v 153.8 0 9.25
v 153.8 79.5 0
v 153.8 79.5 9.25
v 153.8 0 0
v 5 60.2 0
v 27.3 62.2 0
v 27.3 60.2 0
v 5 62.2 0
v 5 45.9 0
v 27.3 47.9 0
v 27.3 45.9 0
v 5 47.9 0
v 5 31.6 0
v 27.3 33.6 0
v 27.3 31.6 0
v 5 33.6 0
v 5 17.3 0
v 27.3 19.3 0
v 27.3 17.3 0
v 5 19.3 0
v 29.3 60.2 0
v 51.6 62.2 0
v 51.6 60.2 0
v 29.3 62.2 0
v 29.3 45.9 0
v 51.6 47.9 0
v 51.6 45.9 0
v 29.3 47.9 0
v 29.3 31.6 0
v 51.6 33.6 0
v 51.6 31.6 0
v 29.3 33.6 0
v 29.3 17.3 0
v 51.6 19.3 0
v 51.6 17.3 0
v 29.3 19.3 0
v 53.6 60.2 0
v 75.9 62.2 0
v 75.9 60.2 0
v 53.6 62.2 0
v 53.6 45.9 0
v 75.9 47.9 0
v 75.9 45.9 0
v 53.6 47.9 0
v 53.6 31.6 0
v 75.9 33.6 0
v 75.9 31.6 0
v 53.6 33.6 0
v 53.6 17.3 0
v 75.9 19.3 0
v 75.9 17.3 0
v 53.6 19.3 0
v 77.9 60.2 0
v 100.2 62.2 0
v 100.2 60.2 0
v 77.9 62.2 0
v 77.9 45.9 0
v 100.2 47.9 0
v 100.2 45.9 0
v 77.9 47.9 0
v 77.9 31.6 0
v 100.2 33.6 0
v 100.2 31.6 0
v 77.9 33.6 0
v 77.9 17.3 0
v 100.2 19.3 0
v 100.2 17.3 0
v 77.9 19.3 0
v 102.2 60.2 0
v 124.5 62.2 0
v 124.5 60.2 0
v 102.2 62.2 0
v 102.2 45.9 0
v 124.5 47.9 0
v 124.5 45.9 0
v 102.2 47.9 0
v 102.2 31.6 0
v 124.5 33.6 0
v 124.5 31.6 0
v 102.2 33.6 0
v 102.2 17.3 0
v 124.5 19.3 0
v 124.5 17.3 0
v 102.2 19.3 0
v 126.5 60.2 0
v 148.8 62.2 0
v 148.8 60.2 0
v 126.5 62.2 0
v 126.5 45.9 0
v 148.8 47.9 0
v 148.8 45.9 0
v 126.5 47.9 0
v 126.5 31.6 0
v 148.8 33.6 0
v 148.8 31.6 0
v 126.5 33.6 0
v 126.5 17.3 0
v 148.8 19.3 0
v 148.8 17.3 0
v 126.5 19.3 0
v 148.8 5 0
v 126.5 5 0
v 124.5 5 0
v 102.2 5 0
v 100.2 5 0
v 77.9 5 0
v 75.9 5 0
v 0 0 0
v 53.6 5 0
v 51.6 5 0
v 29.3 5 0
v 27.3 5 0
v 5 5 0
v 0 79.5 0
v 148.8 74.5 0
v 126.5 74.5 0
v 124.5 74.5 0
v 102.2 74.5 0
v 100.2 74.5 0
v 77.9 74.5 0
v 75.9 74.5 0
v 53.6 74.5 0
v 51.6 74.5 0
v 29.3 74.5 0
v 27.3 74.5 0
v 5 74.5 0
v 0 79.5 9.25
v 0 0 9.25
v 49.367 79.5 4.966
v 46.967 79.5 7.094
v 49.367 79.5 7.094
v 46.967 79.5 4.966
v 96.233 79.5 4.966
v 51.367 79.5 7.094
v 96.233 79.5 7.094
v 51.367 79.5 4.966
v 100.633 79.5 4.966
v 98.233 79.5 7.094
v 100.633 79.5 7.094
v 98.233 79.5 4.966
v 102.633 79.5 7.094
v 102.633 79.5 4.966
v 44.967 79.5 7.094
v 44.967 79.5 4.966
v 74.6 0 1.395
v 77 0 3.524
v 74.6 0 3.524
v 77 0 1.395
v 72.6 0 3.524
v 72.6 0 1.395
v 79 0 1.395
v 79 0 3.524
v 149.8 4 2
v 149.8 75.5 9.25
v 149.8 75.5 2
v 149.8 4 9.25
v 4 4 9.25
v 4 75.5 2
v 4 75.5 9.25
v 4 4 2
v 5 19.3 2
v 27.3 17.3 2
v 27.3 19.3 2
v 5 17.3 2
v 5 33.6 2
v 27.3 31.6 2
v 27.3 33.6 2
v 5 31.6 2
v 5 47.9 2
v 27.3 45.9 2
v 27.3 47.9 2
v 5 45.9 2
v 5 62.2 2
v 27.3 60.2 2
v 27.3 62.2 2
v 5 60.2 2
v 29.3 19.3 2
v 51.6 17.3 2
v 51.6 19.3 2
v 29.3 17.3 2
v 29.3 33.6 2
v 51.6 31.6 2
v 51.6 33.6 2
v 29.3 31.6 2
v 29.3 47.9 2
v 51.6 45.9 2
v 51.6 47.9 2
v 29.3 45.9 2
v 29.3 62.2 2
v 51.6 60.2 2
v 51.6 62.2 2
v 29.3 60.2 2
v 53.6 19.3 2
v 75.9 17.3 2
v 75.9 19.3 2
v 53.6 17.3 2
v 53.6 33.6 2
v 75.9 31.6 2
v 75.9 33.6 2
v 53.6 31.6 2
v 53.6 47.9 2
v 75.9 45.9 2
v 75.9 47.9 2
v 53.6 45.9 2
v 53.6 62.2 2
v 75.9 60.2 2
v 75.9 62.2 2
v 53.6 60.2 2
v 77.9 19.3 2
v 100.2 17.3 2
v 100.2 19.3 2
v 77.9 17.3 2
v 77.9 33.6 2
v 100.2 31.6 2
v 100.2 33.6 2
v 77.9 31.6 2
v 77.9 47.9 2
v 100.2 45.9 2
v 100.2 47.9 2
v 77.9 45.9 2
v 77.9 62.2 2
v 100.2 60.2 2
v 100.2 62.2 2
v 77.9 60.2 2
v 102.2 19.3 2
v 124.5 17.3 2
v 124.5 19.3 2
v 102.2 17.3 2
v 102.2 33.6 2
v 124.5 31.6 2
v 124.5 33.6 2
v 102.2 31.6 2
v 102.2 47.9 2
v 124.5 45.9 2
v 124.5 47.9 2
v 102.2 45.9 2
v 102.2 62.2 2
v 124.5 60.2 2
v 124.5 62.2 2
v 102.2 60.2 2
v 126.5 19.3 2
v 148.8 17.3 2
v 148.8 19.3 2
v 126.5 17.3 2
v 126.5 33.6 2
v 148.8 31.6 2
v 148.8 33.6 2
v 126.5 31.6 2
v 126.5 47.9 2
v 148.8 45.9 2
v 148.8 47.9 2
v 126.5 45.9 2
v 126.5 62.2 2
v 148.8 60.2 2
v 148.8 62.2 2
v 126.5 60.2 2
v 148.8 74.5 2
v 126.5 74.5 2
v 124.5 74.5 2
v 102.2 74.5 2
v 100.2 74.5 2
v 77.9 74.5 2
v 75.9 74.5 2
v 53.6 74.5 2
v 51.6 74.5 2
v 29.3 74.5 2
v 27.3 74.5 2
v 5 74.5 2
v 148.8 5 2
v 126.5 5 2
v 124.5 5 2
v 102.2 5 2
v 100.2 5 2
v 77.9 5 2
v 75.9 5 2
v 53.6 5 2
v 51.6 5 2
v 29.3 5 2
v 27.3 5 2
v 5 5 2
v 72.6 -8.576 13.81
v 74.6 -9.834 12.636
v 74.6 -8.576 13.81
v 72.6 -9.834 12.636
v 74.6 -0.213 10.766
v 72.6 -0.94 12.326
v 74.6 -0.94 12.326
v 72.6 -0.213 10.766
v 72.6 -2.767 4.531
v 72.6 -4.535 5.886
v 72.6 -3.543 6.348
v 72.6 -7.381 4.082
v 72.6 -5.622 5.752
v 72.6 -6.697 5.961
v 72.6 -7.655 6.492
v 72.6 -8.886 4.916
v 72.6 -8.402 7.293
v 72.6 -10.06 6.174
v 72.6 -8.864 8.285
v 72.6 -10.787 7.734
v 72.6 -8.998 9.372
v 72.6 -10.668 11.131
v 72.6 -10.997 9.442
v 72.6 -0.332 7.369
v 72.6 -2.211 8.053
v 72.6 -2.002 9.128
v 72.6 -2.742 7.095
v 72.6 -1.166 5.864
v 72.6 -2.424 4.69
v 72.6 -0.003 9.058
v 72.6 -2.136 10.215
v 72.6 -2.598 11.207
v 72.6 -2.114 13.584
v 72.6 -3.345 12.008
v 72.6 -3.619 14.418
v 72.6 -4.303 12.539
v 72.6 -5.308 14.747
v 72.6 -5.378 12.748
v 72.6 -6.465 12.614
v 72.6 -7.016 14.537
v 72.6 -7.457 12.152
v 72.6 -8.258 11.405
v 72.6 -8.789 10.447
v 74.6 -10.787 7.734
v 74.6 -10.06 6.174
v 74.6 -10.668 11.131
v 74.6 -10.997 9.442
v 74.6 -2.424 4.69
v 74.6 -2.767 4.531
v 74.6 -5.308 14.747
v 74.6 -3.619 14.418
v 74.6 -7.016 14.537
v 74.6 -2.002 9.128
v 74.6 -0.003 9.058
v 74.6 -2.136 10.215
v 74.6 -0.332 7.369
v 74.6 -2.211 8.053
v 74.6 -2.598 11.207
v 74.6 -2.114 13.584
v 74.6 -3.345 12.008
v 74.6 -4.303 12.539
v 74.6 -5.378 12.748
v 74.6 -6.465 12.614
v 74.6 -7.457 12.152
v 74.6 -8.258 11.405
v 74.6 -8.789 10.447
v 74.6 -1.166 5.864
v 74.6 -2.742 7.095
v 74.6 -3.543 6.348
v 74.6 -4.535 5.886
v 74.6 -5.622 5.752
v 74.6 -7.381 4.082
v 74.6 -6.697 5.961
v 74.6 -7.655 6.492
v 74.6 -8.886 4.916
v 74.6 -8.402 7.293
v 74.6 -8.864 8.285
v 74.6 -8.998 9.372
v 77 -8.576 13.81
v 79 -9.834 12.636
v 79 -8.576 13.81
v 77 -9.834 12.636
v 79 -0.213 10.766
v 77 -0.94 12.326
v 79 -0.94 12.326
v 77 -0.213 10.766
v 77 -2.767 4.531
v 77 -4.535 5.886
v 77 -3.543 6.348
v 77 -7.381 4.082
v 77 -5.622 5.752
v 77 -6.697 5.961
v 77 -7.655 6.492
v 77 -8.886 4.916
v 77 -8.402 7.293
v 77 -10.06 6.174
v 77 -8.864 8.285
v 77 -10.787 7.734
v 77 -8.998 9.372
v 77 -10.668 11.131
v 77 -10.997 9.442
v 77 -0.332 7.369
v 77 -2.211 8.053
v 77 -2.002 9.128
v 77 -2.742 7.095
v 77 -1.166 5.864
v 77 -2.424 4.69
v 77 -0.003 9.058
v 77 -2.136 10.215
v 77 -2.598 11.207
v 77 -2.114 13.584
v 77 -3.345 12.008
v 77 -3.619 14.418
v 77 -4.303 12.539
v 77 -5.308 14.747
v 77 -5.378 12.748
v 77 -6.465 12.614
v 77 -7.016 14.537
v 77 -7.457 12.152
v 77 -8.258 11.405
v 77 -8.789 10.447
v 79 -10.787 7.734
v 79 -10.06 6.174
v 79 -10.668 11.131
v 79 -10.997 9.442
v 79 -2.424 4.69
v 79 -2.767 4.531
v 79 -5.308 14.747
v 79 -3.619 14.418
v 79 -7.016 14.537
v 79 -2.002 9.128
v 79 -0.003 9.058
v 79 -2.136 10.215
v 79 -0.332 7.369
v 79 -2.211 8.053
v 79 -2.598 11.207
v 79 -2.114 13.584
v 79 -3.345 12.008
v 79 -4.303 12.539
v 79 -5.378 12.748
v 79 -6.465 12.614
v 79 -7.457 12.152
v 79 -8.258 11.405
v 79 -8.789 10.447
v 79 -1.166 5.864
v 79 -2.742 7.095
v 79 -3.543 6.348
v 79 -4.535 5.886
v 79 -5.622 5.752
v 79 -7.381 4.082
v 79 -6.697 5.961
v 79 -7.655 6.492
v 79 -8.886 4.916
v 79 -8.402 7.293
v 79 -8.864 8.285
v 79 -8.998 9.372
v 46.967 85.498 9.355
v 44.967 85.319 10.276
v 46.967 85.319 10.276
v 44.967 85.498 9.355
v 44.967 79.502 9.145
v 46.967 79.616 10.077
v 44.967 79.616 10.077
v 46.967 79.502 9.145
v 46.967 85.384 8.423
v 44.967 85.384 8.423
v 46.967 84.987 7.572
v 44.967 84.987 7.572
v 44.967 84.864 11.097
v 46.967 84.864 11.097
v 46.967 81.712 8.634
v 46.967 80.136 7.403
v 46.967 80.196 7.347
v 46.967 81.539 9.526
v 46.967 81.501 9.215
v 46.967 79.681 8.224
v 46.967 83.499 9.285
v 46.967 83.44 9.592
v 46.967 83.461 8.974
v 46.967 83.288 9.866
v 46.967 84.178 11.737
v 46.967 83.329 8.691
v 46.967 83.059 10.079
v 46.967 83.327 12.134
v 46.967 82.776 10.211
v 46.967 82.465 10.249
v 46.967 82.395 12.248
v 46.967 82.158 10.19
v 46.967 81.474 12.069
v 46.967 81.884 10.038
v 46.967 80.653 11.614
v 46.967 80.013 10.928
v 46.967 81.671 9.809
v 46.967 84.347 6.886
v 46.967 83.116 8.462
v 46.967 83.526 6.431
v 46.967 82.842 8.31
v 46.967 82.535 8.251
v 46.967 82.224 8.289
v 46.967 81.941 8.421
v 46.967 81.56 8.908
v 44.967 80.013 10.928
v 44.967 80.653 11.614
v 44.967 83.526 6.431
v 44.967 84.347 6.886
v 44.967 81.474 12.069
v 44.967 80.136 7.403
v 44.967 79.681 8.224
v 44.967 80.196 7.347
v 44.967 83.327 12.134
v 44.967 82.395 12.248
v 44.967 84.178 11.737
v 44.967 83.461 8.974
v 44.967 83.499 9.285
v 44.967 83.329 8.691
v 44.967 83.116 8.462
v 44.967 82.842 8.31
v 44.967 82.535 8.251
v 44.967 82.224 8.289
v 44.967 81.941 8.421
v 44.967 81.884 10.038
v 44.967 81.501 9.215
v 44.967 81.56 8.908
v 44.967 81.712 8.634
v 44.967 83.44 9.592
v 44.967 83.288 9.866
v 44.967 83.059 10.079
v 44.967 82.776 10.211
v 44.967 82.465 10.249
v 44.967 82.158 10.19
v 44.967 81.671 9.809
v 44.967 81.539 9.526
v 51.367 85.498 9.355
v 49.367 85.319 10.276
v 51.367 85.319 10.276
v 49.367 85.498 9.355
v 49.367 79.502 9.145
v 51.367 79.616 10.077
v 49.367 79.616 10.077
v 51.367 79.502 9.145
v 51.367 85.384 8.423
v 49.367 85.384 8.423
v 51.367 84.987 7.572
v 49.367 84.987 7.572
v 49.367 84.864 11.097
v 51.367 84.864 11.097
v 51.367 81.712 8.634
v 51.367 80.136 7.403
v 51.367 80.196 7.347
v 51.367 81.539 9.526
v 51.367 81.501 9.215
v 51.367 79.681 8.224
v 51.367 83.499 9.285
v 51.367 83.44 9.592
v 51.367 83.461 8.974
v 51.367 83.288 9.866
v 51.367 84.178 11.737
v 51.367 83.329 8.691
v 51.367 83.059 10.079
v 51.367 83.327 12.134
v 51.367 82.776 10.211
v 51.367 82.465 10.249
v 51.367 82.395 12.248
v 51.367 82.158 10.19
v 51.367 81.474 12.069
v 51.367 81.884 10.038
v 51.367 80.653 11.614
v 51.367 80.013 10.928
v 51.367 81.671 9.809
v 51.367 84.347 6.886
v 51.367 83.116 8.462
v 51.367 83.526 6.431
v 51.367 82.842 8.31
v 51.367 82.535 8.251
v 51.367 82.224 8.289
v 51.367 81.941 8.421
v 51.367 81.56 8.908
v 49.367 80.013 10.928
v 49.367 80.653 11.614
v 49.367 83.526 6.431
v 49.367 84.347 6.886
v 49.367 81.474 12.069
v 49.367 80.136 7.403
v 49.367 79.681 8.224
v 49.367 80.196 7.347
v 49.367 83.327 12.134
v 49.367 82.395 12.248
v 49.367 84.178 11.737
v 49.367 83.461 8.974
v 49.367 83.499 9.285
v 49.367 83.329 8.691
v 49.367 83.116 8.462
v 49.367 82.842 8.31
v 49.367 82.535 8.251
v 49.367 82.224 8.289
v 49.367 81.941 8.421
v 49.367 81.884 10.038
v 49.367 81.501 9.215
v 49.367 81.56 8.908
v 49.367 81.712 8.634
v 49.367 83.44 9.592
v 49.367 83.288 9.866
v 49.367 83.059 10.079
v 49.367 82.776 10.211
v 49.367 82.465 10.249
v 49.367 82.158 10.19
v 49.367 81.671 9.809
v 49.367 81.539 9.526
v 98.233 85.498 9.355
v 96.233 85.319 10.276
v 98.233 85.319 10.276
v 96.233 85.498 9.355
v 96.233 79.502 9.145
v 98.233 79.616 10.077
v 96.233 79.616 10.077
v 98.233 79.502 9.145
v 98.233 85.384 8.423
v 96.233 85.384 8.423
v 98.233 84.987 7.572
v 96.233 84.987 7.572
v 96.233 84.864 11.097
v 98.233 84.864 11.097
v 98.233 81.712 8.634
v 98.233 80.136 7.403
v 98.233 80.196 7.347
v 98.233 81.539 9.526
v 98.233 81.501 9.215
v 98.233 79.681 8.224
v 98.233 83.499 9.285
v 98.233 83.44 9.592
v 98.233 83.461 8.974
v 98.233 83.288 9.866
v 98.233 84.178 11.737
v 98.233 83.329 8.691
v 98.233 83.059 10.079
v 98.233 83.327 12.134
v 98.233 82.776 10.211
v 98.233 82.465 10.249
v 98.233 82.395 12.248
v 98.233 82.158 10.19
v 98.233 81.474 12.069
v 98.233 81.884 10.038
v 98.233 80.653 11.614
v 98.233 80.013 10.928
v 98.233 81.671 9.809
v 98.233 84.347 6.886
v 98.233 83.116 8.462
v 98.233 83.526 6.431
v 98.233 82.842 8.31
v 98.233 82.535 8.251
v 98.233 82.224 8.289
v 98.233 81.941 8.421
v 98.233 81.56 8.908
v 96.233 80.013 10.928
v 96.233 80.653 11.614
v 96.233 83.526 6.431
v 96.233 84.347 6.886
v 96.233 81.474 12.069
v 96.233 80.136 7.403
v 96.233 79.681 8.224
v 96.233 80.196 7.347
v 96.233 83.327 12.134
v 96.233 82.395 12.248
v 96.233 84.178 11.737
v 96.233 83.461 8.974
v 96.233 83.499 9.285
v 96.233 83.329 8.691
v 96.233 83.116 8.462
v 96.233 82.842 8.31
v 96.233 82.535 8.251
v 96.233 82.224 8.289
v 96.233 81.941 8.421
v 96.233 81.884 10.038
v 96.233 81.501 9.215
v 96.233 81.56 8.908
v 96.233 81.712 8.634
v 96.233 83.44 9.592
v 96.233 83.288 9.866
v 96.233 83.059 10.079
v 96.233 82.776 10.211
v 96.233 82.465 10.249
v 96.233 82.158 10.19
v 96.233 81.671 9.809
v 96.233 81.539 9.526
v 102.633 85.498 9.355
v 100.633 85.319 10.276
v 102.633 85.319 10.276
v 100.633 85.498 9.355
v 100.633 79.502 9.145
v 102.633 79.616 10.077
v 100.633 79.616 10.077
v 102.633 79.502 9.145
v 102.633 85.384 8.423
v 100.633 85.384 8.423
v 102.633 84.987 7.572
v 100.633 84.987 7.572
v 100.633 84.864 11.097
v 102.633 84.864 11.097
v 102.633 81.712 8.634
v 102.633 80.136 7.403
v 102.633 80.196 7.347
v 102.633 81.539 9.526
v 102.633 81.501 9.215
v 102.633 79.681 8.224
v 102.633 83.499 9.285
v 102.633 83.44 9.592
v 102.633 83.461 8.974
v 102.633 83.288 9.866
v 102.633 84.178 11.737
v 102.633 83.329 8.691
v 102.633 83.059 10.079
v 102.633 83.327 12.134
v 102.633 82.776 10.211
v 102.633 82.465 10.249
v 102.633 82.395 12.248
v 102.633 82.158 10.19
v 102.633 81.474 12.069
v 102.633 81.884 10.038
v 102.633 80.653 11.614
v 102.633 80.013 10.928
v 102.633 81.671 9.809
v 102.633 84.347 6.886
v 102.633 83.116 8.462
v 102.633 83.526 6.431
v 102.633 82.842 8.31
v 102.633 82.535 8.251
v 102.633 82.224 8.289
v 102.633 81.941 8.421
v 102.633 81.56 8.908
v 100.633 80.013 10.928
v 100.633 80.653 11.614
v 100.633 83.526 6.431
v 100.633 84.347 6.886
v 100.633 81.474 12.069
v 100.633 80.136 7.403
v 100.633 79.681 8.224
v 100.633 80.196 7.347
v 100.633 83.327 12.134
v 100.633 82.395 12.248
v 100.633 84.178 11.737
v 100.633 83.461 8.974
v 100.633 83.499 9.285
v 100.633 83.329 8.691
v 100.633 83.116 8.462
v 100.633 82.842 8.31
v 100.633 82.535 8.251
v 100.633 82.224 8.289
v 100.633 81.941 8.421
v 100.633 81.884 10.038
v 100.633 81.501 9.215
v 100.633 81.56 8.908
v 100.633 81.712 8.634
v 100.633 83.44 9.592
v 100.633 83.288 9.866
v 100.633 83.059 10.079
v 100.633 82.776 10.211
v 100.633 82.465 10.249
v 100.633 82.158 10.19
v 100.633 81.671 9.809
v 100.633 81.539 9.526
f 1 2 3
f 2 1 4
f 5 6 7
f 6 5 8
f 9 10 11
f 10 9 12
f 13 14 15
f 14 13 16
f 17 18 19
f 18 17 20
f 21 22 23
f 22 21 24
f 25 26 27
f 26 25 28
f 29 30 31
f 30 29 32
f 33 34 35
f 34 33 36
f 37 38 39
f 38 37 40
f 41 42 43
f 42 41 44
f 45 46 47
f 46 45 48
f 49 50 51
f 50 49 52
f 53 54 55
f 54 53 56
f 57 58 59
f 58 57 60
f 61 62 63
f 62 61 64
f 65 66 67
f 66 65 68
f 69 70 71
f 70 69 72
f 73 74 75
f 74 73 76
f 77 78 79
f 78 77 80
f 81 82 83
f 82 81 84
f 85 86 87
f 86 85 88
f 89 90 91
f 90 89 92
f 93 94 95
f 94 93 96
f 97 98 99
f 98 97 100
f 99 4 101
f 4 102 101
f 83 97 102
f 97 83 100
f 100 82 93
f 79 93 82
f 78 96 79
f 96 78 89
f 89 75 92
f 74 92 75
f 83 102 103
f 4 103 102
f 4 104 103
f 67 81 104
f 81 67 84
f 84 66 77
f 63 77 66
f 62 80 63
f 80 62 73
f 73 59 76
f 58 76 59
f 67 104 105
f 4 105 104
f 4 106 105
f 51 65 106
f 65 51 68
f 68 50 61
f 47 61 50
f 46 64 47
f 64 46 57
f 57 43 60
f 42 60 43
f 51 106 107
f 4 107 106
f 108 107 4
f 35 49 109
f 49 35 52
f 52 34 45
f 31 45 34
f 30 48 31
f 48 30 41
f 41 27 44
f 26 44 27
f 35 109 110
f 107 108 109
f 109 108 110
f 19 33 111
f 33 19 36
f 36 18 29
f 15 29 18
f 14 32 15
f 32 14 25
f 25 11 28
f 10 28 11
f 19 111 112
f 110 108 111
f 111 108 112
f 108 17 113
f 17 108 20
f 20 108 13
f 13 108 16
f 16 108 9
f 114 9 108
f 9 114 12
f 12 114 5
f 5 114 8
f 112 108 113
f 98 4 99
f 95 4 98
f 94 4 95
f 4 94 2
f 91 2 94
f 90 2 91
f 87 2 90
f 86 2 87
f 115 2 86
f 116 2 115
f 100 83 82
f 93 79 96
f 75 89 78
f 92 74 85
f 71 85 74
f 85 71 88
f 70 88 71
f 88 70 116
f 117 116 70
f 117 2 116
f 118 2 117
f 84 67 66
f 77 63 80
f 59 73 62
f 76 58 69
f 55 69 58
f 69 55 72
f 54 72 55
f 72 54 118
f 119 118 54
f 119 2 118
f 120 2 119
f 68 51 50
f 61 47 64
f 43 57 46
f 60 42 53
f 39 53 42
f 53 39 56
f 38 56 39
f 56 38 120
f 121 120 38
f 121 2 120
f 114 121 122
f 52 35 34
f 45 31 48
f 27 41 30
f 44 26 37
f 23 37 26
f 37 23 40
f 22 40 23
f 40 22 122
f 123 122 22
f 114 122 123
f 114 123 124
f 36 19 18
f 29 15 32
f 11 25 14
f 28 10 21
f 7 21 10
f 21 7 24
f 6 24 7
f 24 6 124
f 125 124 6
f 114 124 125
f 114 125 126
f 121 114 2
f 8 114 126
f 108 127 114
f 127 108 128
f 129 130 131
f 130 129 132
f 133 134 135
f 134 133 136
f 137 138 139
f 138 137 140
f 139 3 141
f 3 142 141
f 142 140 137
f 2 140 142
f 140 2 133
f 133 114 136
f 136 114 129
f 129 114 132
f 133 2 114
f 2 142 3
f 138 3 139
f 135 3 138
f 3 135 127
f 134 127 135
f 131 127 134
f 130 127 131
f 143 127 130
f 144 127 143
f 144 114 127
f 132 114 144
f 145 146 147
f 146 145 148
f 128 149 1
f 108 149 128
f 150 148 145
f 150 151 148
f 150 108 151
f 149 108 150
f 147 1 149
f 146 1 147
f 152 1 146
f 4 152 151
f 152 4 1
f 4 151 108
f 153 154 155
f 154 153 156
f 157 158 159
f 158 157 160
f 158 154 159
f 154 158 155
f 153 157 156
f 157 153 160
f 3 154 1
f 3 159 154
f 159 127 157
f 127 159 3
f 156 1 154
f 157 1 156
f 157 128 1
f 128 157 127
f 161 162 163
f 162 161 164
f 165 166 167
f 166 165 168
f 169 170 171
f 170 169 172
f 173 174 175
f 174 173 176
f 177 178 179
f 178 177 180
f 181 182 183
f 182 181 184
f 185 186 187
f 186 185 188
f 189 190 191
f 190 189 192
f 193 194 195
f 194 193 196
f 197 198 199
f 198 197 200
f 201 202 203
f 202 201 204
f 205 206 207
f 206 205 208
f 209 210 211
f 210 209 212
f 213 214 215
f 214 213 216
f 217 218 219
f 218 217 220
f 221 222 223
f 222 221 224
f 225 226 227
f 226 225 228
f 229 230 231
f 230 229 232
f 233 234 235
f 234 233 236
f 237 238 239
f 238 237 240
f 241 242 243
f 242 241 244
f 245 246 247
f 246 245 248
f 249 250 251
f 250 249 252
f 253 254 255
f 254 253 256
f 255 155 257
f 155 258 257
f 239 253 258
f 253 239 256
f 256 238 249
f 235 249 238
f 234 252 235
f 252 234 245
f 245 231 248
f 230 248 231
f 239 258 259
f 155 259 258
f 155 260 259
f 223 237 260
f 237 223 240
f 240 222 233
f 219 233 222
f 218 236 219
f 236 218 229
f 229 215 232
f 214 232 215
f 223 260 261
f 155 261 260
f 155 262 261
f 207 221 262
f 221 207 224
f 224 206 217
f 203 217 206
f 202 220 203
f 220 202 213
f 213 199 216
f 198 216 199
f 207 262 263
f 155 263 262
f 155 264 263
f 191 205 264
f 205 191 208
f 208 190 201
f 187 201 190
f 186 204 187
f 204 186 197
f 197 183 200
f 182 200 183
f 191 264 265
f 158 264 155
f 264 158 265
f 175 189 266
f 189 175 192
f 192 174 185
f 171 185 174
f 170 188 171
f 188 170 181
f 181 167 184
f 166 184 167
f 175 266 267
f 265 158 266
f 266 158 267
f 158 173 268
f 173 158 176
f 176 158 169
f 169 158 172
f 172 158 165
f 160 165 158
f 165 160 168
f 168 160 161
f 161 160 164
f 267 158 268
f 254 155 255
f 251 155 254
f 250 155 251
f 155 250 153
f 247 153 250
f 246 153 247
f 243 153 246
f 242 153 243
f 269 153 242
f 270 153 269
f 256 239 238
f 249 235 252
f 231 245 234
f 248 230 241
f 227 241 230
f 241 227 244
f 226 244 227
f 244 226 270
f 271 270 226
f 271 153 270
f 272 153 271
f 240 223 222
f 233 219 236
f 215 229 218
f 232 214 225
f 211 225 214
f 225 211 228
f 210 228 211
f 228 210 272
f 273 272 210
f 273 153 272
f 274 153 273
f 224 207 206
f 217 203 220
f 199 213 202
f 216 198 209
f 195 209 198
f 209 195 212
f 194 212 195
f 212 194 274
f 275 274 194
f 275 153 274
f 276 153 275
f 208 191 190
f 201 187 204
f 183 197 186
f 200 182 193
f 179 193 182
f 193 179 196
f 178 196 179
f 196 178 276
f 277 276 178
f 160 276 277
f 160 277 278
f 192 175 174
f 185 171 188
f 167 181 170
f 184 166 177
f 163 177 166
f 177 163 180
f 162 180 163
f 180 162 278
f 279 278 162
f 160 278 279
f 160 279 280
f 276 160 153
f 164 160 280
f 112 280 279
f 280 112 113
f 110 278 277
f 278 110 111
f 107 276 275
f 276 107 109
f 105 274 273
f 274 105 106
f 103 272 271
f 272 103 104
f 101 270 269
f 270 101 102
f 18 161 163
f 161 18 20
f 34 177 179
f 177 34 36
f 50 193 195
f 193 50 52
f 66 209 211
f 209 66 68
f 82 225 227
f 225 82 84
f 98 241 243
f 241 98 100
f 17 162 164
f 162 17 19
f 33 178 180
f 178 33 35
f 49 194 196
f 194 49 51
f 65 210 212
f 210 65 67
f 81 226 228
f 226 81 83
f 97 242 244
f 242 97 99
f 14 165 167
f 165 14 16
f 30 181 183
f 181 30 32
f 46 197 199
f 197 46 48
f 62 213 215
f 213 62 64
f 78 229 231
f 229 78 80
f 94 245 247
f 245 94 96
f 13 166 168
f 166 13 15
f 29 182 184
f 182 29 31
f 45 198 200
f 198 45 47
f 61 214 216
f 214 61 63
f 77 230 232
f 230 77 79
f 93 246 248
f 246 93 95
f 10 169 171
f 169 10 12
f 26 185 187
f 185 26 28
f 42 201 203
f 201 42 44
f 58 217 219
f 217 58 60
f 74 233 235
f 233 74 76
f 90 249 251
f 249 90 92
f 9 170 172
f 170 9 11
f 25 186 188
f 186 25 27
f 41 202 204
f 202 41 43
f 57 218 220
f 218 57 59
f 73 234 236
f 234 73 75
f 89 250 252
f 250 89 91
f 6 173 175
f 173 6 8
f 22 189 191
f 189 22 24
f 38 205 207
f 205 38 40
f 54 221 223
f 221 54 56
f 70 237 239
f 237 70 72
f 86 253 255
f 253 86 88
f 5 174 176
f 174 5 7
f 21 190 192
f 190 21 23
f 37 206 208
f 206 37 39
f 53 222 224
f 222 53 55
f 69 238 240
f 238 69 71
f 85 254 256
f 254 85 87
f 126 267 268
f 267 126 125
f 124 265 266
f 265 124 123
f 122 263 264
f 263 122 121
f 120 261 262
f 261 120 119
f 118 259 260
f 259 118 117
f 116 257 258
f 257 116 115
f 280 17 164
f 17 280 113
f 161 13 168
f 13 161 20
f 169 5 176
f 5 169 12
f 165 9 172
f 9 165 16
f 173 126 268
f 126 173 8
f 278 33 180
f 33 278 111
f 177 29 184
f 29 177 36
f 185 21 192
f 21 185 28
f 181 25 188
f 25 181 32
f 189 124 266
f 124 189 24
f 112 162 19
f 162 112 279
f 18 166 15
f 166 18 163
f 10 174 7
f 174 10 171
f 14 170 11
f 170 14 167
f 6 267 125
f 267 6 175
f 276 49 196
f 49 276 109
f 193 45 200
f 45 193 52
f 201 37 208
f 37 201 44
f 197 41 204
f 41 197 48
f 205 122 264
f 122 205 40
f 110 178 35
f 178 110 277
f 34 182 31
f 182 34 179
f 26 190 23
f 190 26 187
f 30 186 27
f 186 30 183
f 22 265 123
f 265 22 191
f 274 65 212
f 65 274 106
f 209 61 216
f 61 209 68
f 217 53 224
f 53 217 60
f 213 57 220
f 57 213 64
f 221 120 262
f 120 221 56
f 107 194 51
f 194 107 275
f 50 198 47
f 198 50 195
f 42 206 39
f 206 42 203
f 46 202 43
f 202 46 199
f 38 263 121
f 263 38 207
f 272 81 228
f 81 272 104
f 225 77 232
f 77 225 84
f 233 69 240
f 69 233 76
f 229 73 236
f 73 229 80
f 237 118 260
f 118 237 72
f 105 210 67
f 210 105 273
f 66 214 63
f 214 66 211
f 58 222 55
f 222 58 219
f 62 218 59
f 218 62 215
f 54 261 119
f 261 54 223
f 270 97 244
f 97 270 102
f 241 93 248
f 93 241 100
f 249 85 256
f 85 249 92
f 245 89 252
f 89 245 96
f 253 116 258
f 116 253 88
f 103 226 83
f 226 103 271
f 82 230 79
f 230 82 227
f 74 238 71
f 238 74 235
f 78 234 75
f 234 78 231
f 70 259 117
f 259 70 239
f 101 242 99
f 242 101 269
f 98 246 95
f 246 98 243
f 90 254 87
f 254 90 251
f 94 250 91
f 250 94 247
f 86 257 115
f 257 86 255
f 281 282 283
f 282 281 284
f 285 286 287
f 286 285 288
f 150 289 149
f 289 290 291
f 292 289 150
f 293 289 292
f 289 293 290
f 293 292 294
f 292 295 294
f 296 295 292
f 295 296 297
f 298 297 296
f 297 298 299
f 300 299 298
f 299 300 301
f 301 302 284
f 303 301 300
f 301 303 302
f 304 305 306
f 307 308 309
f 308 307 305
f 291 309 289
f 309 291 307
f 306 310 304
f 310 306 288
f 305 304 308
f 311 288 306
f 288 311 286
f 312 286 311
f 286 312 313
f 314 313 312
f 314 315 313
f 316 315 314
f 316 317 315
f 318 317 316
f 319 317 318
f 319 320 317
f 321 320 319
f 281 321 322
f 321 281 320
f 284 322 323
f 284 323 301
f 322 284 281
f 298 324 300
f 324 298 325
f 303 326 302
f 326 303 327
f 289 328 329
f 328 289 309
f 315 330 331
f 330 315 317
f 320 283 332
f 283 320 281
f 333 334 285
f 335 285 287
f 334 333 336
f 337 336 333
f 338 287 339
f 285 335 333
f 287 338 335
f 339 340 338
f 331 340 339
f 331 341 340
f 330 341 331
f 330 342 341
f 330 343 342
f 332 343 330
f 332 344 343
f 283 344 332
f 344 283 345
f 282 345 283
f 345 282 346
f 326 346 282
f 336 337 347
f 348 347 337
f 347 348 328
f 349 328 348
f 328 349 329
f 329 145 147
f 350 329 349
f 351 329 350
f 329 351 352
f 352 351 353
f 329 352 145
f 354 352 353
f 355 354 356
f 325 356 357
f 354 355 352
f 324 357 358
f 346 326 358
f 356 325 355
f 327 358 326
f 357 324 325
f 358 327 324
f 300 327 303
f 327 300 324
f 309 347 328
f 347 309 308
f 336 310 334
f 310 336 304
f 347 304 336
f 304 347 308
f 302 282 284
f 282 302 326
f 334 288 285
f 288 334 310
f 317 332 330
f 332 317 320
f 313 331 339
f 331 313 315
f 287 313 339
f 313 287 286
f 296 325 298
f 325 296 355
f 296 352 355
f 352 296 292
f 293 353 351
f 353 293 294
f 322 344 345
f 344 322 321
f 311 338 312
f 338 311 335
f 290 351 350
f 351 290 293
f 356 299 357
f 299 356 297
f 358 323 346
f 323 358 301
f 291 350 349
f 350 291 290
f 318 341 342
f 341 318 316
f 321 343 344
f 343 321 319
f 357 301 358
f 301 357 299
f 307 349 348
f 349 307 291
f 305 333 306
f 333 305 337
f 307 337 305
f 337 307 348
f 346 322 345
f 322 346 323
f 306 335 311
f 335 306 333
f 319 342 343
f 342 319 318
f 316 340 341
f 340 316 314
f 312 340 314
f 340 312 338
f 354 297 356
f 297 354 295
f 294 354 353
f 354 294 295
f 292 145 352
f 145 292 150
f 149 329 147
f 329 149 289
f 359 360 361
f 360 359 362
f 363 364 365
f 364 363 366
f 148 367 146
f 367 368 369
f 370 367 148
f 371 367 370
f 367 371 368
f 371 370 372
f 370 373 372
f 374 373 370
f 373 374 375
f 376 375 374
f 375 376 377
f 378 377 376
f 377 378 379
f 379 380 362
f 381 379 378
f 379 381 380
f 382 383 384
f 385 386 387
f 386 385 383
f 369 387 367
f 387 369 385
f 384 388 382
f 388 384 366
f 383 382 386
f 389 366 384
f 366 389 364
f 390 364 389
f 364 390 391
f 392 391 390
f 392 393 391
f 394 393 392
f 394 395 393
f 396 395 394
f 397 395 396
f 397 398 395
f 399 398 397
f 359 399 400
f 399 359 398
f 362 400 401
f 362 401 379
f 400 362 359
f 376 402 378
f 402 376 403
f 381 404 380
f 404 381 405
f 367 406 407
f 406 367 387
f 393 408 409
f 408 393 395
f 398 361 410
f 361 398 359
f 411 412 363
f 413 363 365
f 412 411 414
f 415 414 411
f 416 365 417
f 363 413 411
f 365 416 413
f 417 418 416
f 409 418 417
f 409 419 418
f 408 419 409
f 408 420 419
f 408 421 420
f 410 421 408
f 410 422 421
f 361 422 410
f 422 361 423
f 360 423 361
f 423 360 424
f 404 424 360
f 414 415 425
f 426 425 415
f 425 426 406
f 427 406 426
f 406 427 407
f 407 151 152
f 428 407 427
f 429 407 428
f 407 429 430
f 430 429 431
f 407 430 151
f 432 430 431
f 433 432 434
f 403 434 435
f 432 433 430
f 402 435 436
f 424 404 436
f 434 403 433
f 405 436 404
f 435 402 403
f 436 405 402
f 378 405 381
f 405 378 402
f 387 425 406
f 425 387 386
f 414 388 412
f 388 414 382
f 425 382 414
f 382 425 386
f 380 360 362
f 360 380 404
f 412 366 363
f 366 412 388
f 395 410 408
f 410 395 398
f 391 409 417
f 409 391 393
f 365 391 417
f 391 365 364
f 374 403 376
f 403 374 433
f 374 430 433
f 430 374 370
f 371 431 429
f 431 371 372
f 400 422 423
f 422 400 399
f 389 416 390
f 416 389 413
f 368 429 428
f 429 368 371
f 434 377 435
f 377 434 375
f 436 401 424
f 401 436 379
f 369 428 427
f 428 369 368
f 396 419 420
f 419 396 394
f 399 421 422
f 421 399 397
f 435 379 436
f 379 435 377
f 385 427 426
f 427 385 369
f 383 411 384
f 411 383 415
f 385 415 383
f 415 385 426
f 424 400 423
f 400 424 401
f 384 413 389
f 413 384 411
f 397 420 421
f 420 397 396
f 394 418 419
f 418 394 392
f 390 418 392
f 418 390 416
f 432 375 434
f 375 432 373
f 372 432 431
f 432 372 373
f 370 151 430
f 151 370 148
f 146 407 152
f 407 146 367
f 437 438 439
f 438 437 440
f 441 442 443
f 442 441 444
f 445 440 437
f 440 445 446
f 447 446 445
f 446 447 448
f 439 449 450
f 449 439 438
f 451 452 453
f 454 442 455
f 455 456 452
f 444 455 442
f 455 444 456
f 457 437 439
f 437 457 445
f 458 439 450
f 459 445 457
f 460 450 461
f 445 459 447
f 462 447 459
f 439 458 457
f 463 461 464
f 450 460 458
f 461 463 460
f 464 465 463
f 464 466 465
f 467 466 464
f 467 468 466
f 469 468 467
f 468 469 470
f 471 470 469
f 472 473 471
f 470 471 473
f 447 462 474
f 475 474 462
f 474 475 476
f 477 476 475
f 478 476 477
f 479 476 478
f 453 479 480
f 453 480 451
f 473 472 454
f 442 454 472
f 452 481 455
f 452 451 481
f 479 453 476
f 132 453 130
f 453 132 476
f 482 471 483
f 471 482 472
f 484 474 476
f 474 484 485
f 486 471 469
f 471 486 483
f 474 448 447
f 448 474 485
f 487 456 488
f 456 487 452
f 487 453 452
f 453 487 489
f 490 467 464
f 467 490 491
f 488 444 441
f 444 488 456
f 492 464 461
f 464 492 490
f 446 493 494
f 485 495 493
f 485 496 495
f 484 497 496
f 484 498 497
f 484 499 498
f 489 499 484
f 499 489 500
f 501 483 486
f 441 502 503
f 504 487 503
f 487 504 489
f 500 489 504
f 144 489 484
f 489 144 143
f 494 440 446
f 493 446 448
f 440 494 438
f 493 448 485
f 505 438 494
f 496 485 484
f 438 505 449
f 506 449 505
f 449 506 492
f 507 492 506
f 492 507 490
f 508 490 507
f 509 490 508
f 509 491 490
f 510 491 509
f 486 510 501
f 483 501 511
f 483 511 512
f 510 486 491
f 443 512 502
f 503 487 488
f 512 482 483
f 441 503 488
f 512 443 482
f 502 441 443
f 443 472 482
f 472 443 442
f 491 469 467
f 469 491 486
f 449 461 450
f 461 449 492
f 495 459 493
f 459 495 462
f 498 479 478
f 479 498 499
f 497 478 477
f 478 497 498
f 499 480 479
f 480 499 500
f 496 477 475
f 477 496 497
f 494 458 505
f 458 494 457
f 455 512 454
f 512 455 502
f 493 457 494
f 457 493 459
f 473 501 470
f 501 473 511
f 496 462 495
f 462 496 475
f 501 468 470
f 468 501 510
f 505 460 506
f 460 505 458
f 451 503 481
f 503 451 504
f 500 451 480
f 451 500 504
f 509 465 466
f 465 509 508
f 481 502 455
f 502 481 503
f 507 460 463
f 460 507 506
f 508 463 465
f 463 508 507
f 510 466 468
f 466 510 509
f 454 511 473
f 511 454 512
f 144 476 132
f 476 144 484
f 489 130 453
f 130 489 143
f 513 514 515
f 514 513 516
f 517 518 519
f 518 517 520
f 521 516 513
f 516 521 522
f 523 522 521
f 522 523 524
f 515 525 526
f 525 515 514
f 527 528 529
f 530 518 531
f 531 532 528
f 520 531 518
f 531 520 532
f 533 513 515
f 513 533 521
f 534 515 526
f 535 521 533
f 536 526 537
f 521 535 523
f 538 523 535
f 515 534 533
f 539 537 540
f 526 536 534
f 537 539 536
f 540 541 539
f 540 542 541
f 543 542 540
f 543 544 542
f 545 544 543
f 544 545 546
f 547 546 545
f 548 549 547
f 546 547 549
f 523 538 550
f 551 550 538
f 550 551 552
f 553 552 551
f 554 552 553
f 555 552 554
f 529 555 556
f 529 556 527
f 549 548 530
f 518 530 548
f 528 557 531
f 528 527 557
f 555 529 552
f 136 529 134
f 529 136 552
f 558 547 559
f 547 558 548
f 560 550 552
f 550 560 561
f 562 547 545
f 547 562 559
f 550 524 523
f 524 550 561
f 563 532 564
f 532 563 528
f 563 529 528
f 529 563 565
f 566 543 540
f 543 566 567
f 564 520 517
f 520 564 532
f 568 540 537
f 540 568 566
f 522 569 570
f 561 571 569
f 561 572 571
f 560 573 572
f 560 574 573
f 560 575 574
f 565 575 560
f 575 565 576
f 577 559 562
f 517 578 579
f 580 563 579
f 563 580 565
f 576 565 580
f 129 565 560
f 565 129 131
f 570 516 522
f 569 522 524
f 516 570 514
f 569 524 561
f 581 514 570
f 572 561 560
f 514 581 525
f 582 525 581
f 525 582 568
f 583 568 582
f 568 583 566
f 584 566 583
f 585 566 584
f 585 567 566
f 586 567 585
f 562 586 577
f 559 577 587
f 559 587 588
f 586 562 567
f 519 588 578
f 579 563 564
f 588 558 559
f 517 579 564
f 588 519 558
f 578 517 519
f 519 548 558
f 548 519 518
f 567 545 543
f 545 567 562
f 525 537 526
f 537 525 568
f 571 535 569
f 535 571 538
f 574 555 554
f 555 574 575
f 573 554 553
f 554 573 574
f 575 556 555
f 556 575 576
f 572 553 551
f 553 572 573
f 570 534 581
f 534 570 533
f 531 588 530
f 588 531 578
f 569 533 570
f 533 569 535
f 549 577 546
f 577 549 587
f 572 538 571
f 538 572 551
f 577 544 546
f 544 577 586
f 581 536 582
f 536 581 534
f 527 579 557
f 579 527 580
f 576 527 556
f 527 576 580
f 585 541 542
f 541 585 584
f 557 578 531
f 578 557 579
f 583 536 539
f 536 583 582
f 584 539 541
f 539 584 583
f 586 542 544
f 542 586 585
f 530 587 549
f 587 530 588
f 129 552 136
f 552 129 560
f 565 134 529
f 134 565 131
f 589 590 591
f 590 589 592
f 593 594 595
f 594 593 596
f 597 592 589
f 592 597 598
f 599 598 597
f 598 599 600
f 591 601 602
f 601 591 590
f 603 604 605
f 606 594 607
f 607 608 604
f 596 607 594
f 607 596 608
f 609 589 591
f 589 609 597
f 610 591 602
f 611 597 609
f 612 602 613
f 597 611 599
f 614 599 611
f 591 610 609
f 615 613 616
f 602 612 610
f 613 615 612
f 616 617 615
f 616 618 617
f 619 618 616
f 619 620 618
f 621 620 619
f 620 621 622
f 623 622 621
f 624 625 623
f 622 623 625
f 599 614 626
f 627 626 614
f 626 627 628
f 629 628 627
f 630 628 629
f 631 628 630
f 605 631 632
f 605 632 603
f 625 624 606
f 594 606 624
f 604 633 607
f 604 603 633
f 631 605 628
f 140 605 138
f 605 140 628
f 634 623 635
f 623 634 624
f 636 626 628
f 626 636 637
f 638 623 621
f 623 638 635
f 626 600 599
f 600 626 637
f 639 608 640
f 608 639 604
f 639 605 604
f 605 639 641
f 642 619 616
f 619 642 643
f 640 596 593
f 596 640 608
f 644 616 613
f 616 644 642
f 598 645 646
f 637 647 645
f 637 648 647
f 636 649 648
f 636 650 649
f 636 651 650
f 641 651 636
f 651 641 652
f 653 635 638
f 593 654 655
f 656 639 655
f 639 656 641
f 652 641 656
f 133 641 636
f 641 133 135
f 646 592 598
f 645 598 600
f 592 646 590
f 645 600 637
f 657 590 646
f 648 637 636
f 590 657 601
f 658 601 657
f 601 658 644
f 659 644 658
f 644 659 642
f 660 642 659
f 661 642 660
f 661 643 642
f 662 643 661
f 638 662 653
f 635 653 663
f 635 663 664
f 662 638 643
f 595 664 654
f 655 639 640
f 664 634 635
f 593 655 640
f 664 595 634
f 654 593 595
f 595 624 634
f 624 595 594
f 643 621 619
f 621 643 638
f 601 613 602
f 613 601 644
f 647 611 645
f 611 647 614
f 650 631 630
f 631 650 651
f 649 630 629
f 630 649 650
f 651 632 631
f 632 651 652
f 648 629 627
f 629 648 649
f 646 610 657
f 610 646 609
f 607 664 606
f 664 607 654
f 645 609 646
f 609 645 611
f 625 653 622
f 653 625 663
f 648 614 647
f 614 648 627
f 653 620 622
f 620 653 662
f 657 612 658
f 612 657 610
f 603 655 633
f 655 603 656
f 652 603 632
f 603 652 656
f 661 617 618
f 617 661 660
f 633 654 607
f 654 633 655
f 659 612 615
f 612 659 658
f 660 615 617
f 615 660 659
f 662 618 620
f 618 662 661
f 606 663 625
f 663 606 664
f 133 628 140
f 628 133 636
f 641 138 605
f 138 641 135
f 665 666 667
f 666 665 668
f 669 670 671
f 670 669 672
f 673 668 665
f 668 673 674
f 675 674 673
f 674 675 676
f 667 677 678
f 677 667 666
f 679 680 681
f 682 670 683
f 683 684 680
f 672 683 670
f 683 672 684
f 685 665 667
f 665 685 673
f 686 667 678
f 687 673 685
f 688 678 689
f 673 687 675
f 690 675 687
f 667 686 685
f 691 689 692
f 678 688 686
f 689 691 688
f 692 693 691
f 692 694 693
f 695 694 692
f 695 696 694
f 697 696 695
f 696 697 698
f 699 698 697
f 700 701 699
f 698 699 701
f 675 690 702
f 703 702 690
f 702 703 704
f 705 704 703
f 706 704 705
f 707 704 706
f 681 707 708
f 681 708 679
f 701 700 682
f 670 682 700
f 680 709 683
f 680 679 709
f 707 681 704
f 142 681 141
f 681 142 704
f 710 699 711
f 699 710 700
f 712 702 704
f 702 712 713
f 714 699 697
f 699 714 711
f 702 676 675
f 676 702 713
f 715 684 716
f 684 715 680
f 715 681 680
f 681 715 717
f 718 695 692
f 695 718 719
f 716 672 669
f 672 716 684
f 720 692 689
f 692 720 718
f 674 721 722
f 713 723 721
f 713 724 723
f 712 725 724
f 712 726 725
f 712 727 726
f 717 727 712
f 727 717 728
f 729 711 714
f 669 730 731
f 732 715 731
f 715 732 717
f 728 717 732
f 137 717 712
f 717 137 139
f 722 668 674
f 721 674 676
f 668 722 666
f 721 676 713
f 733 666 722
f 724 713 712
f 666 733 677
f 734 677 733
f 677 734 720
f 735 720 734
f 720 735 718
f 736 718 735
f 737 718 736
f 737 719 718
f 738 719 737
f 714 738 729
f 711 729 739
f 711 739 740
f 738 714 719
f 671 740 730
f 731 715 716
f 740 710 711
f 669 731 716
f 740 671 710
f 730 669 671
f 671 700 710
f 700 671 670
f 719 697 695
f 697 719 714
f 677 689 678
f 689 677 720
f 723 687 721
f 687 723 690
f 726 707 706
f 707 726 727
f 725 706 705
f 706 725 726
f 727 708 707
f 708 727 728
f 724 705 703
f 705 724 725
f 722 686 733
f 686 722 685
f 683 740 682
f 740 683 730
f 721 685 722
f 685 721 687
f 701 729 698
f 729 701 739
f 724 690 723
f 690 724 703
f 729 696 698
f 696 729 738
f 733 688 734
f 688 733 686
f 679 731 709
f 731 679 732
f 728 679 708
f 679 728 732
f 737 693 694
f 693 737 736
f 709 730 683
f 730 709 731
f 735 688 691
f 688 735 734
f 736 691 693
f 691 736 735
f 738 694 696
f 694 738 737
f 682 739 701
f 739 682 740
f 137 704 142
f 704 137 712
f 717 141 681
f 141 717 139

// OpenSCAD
size = [143.8,69.5,8.5];
border = [4,4,4];
margin = [2,2,2];

bar_size = 2;
v_bars = 5;
h_bars = 6;

lock_hole_radius = 3.5;
lock_ring_size = 2;

joints = 2;
joint_hole_radius = 1;
joint_ring_size = 2;

lock_rings = 2;
total_size = size + margin + border*2;
window_size = size + margin;
clearance = 0.2;

$fn = 20;

module half_prison() {
    difference(){
        cube(total_size);
        translate([border.x, border.y, 0]) cube(window_size);
        translate([0,0,total_size.z/2])cube(total_size);
    }

    for(i=[0:v_bars]){
        translate([0, window_size.y*i/v_bars-bar_size/2+border.y, 0]) cube([total_size.x, bar_size, bar_size]);
    }

    for(i=[0:h_bars]){
        translate([window_size.x*i/h_bars-bar_size/2+border.x, 0, 0]) cube([bar_size, total_size.y, bar_size]);
    }
}

module lock_ring() {
    difference() {
        cylinder(lock_ring_size, lock_hole_radius+lock_ring_size, lock_hole_radius+lock_ring_size);
        cylinder(lock_ring_size, lock_hole_radius, lock_hole_radius);
    }
    translate([lock_hole_radius,0,0]) cube([lock_ring_size, (lock_ring_size+lock_hole_radius)*2, lock_ring_size]);
}


module joint_ring() {
    difference() {
        cylinder(joint_ring_size, joint_hole_radius+joint_ring_size, joint_hole_radius+joint_ring_size);
        cylinder(joint_ring_size, joint_hole_radius, joint_hole_radius);
    }
    translate([joint_hole_radius,0,0]) cube([joint_ring_size, (joint_ring_size+joint_hole_radius)*2, joint_ring_size]);
}

half_prison();

translate([-lock_rings*(lock_ring_size+clearance)+clearance/2,0,0])
for(i=[0:lock_rings-1]){
    translate([total_size.x/2+i*(lock_ring_size+clearance)*2,-lock_ring_size-lock_hole_radius,total_size.z/2])
    rotate([-20,0,0])
    rotate([0,90,0])
    lock_ring();
}

for(j=[1:joints]){
    translate([total_size.x/(joints+1)*j-lock_rings*(joint_ring_size+clearance)+clearance/2,0,0])
    for(i=[0:lock_rings-1]){
        translate([i*(joint_ring_size+clearance)*2,total_size.y+joint_hole_radius+joint_ring_size,total_size.z/2])
        rotate([20,0,0])
        rotate([0,90,180])
        joint_ring();
    }
}
